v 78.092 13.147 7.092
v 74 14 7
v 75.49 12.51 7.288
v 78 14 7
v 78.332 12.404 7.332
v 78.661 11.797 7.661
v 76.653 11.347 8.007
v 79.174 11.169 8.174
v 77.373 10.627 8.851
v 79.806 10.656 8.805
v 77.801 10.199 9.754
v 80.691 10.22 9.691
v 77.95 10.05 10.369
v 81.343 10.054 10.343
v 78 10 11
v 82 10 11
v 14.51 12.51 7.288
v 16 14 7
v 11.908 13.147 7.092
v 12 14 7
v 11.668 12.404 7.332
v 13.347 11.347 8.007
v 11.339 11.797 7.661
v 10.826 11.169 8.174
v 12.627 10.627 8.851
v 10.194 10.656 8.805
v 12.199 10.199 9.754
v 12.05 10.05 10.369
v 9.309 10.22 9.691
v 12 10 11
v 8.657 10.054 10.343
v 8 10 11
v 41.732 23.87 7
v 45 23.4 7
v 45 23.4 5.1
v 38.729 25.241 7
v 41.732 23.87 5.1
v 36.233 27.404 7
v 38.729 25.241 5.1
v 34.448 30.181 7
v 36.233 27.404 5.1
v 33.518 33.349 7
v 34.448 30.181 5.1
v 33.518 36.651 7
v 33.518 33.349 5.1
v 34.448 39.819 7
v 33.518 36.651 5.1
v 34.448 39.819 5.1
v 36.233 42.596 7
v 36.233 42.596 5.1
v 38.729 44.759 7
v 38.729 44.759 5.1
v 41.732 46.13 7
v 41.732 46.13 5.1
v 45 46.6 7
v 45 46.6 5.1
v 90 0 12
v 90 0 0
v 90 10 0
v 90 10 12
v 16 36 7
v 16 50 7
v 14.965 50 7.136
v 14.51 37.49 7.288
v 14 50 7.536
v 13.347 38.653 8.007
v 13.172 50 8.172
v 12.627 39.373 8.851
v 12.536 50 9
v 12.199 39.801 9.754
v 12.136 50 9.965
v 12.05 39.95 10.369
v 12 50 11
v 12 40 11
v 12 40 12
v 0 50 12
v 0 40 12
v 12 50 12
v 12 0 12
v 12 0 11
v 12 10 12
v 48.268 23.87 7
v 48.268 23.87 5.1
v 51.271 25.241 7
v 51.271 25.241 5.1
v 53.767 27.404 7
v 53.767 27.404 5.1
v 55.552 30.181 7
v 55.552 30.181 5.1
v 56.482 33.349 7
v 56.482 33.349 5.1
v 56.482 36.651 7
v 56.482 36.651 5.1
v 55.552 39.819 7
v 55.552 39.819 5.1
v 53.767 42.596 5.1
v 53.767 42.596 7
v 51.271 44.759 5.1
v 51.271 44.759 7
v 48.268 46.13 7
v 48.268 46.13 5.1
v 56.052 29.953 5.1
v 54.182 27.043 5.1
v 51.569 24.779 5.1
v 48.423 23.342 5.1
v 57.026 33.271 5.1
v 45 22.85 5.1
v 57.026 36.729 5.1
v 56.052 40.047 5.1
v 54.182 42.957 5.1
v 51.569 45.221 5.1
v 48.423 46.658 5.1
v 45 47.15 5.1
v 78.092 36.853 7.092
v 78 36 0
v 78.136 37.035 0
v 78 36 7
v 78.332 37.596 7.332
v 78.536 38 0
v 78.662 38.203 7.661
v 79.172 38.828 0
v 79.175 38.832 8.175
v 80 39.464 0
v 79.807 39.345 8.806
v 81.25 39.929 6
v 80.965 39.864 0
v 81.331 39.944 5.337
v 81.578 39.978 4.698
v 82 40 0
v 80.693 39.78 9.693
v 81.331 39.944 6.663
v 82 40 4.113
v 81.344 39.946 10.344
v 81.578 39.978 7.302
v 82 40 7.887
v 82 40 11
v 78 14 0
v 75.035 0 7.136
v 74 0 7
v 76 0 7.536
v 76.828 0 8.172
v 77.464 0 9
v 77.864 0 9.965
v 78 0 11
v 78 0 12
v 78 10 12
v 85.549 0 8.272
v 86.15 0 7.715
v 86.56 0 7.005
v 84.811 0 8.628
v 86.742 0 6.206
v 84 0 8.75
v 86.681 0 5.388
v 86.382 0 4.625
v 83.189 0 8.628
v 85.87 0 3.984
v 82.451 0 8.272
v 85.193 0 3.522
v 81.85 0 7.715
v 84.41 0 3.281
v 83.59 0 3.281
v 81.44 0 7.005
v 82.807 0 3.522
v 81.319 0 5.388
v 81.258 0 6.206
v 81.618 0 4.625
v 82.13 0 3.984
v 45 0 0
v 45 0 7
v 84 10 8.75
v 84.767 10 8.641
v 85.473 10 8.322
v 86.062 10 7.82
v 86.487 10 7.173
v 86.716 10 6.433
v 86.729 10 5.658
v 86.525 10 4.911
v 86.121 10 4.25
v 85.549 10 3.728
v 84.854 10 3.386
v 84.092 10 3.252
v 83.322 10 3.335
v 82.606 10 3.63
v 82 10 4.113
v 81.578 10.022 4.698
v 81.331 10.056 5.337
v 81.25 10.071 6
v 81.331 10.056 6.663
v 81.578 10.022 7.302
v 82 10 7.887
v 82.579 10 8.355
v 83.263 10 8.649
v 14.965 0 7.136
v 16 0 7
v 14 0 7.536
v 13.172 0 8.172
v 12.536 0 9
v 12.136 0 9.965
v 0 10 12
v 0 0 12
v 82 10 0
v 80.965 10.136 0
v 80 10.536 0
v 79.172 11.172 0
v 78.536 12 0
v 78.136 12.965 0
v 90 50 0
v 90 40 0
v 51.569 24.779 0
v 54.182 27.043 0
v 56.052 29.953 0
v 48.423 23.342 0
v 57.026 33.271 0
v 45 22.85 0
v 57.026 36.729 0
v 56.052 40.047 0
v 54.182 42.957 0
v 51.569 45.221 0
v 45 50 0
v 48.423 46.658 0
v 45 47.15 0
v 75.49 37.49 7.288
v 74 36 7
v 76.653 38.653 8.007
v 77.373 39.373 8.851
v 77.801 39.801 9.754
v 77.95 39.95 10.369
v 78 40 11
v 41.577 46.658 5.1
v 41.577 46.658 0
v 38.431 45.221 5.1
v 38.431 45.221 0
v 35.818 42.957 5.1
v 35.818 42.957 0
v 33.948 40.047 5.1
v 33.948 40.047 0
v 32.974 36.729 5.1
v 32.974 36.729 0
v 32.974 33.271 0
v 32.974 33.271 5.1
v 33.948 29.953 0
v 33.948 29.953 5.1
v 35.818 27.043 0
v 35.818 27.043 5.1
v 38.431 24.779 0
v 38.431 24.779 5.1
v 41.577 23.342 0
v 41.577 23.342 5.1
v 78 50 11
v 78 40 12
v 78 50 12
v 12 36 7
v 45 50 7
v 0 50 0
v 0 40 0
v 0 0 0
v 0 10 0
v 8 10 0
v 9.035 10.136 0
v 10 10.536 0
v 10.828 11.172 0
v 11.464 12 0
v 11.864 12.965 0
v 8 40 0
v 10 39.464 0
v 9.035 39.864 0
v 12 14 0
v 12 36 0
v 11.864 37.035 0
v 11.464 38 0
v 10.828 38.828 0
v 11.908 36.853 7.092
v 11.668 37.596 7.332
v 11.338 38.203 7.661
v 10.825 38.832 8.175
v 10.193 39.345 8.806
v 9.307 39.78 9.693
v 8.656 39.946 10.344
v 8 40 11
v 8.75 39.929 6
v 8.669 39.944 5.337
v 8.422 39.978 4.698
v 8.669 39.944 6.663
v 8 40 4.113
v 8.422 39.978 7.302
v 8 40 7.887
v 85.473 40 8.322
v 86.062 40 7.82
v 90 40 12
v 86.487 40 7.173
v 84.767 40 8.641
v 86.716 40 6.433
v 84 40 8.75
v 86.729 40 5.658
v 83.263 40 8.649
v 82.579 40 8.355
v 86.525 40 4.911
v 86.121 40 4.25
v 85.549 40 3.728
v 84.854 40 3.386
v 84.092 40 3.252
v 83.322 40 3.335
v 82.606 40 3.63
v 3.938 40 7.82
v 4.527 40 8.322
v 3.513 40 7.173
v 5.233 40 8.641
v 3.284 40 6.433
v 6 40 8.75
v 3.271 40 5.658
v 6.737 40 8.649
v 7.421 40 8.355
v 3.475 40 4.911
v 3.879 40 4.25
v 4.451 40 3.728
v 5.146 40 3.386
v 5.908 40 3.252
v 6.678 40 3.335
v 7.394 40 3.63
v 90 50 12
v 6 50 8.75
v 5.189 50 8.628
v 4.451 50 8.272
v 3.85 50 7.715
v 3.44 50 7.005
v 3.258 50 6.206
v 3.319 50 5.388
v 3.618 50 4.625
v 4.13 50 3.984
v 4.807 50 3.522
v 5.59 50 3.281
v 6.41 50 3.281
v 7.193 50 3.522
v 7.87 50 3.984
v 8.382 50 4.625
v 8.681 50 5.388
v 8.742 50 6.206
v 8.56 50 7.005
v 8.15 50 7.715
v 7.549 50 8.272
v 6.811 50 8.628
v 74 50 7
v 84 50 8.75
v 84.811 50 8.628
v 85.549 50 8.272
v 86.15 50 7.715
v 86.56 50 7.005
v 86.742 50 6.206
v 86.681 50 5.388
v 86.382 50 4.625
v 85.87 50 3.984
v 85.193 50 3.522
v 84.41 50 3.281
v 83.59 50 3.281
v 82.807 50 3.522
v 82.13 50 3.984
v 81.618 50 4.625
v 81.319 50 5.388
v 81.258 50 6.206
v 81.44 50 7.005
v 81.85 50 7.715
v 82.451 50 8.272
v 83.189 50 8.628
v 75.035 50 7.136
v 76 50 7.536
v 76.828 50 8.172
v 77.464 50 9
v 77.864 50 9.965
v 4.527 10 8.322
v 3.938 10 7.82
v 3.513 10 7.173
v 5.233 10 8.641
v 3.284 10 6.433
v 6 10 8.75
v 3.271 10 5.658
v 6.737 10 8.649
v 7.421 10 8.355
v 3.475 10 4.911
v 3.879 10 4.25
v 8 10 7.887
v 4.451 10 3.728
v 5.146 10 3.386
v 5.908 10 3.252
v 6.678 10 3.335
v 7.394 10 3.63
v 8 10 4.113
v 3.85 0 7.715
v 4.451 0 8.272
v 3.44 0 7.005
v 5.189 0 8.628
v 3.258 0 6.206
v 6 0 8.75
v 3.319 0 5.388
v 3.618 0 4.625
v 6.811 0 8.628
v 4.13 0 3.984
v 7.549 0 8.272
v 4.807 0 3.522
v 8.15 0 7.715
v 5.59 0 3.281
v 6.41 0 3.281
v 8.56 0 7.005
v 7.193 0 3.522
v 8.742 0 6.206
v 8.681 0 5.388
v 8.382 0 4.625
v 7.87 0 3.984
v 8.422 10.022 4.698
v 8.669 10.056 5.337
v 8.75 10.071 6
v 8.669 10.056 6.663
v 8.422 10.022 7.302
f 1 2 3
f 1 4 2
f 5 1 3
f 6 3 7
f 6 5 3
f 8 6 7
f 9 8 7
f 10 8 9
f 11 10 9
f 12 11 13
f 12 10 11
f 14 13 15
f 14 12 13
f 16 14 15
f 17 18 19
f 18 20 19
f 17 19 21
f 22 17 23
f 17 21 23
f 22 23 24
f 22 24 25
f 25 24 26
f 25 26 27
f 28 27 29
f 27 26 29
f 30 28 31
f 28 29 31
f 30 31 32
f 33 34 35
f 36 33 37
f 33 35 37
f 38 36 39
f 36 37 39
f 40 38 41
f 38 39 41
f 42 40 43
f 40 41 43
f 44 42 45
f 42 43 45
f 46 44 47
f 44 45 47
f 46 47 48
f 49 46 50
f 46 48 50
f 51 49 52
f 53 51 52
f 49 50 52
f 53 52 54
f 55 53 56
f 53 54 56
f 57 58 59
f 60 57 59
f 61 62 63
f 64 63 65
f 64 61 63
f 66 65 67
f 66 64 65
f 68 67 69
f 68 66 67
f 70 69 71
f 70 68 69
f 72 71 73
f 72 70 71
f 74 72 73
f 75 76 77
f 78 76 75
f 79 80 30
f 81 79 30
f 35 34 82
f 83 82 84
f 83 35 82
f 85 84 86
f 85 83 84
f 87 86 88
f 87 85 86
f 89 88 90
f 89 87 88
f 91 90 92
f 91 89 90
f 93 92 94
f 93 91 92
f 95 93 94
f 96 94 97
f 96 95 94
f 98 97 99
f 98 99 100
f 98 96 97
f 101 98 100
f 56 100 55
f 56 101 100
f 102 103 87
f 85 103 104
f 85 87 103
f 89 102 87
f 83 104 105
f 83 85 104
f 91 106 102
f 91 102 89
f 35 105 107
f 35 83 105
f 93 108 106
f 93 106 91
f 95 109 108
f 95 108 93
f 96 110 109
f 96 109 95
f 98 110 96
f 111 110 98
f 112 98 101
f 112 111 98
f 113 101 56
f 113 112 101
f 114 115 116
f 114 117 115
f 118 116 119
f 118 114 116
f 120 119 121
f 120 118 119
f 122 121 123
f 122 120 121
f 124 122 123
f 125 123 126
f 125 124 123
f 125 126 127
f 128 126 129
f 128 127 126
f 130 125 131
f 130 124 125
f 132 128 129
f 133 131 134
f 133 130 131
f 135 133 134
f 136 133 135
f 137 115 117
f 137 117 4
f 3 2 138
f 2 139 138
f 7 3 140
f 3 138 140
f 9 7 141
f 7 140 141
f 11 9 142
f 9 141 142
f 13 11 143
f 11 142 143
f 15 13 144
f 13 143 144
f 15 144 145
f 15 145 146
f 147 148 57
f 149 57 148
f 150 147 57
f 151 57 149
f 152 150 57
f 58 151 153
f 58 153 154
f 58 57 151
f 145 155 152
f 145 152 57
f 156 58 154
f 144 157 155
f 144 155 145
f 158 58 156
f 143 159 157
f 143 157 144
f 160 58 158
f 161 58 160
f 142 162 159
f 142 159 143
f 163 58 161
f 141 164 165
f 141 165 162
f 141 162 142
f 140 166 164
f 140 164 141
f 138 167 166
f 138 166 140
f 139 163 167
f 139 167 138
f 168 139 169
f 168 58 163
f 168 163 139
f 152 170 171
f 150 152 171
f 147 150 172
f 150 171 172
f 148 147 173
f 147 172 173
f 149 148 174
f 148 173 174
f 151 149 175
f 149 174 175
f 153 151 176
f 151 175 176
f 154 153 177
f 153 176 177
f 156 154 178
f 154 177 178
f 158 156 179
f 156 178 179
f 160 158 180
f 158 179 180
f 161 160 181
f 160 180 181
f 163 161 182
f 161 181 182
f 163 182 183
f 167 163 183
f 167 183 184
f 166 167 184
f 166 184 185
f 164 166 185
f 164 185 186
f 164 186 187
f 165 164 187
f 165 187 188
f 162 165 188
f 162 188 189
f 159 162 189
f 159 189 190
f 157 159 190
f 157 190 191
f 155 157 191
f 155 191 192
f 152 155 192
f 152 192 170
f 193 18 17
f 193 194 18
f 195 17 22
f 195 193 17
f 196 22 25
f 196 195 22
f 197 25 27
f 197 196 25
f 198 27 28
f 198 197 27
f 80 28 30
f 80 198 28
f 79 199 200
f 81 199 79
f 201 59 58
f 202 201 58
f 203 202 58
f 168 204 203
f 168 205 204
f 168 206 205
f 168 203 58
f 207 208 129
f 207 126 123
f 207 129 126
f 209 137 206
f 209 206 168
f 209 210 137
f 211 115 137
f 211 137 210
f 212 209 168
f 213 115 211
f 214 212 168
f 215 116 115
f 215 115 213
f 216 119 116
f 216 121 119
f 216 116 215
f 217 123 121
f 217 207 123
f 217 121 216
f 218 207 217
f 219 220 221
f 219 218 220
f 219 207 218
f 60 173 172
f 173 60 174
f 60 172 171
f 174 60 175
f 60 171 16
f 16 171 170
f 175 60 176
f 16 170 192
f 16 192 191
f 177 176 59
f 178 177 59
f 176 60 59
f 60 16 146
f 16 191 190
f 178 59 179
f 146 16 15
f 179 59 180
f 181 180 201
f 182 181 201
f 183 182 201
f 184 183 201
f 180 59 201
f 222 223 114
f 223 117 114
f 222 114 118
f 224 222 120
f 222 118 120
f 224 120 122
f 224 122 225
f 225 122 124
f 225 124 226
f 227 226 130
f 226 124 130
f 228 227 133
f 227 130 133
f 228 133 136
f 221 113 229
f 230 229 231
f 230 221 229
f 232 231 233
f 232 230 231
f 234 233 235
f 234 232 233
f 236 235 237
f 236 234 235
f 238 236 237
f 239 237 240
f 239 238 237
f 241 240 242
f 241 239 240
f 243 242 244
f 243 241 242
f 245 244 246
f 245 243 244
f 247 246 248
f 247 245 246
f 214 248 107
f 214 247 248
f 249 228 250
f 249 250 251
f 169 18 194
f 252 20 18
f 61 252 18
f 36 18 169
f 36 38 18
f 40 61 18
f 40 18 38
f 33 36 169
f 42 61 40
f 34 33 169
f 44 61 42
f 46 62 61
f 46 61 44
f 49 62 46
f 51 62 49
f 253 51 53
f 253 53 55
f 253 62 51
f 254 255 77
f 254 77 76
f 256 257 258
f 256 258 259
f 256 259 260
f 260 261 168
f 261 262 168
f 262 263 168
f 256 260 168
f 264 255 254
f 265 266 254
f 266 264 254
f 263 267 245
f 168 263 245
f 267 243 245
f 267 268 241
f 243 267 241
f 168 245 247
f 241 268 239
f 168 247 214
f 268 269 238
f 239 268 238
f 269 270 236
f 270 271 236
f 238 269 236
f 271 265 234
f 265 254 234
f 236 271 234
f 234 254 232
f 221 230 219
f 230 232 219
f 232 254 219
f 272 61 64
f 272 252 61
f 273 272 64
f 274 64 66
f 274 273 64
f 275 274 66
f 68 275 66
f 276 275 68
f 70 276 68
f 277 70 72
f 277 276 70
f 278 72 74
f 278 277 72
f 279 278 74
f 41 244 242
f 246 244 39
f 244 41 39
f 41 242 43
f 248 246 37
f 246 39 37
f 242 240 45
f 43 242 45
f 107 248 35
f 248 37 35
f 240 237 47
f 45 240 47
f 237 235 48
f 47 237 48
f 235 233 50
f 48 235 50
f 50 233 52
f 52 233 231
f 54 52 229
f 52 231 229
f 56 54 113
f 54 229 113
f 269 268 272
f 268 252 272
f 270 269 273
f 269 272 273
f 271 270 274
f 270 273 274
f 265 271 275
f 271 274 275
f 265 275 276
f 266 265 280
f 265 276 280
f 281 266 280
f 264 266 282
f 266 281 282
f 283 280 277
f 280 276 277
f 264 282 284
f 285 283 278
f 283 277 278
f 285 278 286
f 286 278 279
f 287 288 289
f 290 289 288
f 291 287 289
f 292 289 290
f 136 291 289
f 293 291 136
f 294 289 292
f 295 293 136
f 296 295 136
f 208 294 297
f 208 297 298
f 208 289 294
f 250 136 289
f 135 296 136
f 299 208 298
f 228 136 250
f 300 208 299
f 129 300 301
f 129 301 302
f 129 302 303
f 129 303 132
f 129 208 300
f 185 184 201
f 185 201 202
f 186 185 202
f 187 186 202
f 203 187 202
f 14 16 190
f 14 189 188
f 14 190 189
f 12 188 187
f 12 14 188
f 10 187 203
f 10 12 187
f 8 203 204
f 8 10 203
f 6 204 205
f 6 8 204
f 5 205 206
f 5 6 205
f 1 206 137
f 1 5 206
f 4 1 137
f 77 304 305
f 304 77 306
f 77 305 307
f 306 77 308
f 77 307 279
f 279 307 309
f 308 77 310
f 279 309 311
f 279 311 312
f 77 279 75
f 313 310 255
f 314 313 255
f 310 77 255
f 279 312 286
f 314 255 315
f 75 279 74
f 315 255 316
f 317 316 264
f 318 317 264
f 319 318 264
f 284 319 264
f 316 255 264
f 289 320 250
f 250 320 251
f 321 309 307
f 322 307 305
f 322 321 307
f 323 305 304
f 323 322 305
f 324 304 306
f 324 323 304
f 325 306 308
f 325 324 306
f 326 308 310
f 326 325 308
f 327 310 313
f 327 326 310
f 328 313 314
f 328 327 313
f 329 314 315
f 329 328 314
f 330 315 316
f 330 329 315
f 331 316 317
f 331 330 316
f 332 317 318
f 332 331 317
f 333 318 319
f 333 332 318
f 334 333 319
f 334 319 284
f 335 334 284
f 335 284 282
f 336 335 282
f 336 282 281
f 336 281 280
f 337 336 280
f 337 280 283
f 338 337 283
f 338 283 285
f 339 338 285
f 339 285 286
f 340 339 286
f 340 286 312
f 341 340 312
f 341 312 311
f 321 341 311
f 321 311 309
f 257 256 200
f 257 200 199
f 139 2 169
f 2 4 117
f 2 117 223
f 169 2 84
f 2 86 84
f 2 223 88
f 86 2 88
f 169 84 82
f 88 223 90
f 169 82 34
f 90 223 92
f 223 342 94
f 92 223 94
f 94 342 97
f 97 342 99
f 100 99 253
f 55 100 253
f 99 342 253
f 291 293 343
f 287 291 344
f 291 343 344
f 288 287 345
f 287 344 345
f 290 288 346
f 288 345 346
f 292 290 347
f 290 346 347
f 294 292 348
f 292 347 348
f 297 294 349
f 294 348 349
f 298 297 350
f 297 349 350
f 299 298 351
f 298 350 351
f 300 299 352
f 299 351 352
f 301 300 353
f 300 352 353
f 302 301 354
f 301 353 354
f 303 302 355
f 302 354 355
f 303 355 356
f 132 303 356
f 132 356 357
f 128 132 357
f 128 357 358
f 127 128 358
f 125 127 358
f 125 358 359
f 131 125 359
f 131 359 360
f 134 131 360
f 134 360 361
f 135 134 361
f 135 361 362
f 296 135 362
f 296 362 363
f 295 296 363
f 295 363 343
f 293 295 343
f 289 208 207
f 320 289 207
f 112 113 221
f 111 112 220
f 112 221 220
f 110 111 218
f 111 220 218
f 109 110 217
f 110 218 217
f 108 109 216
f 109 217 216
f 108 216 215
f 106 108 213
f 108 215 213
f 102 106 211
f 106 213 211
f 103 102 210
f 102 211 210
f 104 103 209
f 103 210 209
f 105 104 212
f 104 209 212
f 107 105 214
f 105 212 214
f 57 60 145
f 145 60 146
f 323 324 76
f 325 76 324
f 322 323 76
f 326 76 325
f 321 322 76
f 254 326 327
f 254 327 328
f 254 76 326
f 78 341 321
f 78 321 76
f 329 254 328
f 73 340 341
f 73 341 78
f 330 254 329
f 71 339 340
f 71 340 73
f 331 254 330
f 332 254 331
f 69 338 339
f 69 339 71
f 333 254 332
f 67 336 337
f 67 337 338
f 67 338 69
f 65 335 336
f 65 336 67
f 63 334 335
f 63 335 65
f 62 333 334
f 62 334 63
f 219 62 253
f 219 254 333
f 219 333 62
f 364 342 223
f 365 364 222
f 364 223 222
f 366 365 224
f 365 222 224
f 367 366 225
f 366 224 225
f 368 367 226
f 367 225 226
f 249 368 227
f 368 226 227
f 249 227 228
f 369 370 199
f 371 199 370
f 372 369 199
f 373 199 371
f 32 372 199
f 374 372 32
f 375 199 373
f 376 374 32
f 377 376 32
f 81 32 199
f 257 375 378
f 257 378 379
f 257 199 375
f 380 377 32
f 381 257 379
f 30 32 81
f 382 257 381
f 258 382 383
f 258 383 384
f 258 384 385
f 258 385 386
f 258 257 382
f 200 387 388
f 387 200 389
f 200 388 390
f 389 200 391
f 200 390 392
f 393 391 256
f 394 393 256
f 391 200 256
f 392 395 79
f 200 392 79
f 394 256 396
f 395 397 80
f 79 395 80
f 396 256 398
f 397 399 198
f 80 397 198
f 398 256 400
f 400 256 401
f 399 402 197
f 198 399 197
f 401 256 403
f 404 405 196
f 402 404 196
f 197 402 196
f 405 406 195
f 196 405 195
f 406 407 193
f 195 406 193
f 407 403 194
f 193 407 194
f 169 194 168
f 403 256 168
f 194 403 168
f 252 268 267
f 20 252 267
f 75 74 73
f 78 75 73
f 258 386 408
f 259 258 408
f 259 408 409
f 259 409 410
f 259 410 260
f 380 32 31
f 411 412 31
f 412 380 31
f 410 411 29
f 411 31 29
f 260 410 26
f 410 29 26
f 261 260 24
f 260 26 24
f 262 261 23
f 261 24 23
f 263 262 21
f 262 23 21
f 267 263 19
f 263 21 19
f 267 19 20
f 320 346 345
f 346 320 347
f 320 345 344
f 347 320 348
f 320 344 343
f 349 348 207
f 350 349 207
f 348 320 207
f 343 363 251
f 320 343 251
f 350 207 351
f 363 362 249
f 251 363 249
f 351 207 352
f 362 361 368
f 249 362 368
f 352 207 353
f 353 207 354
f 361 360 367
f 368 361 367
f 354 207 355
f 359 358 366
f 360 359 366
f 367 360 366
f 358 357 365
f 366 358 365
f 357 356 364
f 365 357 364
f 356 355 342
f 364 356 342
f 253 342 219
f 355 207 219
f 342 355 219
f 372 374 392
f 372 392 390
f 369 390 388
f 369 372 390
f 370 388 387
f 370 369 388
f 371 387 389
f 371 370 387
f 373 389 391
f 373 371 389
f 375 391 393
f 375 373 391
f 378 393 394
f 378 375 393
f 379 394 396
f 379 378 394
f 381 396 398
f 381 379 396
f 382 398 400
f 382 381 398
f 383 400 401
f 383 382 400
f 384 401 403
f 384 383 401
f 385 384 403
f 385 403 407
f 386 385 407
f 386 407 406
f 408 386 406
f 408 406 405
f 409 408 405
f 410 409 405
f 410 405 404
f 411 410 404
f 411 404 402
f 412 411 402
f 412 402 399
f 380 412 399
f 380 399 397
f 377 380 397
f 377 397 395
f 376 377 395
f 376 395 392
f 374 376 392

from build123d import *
from build123d.topology import SkipClean

# Parameters (mm, degrees)
BOSS_EXTRUDE1_DEPTH = 7
SKETCH2_W           = 12
SKETCH2_H           = 10
BOSS_EXTRUDE2_DEPTH = 12
FILLET1_R           = 4
FILLET2_R           = 4
SKETCH3_R           = 2.75
CUT_EXTRUDE1_DEPTH  = 104.653269711
SKETCH4_R           = 12.15
CUT_EXTRUDE2_DEPTH  = 5.1


with BuildPart() as part:
    # Sketch1 → Boss-Extrude1 (new body)
    with BuildSketch(Plane.XY):
        with BuildLine():
            Line((45.000001788, 50), (78.000001788, 50))
            Line((78.000001788, 50), (78.000001788, 0))
            Line((78.000001788, 0), (45.000001788, 0))
            Line((45.000001788, 0), (45.000001788, 23.4))
            ThreePointArc((45.000001788, 23.4), (56.600001788, 35), (45.000001788, 46.6))
            Line((45.000001788, 46.6), (45.000001788, 50))
        make_face()
    extrude(amount=BOSS_EXTRUDE1_DEPTH)

    # Sketch2 → Boss-Extrude2 (add)
    with BuildSketch(Plane(origin=(0, 0, 0), x_dir=(-1, 0, 0), z_dir=(0, 0, -1))):
        with Locations((-84.000001788, 45)):
            Rectangle(SKETCH2_W, SKETCH2_H)
        with Locations((-84.000001788, 5)):
            Rectangle(SKETCH2_W, SKETCH2_H)
    extrude(amount=-BOSS_EXTRUDE2_DEPTH)

    # Fillet1
    fillet1_edges = [part.edges().sort_by_distance(p)[0] for p in [
        (78.000001788, 40, 3.5),
        (78.000001788, 10, 3.5),
    ]]
    fillet(fillet1_edges, radius=FILLET1_R)

    # Fillet2
    fillet2_edges = [part.edges().sort_by_distance(p)[0] for p in [
        (78.000001788, 5, 7),
        (80.000001788, 10, 7),
        (78.000001788, 45, 7),
        (80.000001788, 40, 7),
    ]]
    fillet(fillet2_edges, radius=FILLET2_R - 0.0001)  # a hair under: the kernel refuses the full size

    # Sketch3 → Cut-Extrude1 (cut, through all)
    with BuildSketch(Plane(origin=(0, 50, 0), x_dir=(1, 0, 0), z_dir=(0, 1, 0))):
        with Locations(Location((84.000001788, -6, 0), (0, 0, 270))):
            Circle(SKETCH3_R)
    extrude(amount=-CUT_EXTRUDE1_DEPTH, mode=Mode.SUBTRACT)

    # Sketch4 → Cut-Extrude2 (cut)
    with BuildSketch(Plane(origin=(0, 0, 0), x_dir=(-1, 0, 0), z_dir=(0, 0, -1))):
        with Locations((-45.000001788, 35)):
            Circle(SKETCH4_R)
    extrude(amount=-CUT_EXTRUDE2_DEPTH, mode=Mode.SUBTRACT)

    # Mirror1: part across plane


with BuildPart() as part_1:
    with SkipClean():  # the faces are left unmerged after this step: merging them gives an invalid solid
        add(part.part)
        add(part.part.mirror(Plane(origin=(45.000001788, 23.4, 7), x_dir=(0, 0, 1), z_dir=(1, 0, 0))))


solid = part_1.part
